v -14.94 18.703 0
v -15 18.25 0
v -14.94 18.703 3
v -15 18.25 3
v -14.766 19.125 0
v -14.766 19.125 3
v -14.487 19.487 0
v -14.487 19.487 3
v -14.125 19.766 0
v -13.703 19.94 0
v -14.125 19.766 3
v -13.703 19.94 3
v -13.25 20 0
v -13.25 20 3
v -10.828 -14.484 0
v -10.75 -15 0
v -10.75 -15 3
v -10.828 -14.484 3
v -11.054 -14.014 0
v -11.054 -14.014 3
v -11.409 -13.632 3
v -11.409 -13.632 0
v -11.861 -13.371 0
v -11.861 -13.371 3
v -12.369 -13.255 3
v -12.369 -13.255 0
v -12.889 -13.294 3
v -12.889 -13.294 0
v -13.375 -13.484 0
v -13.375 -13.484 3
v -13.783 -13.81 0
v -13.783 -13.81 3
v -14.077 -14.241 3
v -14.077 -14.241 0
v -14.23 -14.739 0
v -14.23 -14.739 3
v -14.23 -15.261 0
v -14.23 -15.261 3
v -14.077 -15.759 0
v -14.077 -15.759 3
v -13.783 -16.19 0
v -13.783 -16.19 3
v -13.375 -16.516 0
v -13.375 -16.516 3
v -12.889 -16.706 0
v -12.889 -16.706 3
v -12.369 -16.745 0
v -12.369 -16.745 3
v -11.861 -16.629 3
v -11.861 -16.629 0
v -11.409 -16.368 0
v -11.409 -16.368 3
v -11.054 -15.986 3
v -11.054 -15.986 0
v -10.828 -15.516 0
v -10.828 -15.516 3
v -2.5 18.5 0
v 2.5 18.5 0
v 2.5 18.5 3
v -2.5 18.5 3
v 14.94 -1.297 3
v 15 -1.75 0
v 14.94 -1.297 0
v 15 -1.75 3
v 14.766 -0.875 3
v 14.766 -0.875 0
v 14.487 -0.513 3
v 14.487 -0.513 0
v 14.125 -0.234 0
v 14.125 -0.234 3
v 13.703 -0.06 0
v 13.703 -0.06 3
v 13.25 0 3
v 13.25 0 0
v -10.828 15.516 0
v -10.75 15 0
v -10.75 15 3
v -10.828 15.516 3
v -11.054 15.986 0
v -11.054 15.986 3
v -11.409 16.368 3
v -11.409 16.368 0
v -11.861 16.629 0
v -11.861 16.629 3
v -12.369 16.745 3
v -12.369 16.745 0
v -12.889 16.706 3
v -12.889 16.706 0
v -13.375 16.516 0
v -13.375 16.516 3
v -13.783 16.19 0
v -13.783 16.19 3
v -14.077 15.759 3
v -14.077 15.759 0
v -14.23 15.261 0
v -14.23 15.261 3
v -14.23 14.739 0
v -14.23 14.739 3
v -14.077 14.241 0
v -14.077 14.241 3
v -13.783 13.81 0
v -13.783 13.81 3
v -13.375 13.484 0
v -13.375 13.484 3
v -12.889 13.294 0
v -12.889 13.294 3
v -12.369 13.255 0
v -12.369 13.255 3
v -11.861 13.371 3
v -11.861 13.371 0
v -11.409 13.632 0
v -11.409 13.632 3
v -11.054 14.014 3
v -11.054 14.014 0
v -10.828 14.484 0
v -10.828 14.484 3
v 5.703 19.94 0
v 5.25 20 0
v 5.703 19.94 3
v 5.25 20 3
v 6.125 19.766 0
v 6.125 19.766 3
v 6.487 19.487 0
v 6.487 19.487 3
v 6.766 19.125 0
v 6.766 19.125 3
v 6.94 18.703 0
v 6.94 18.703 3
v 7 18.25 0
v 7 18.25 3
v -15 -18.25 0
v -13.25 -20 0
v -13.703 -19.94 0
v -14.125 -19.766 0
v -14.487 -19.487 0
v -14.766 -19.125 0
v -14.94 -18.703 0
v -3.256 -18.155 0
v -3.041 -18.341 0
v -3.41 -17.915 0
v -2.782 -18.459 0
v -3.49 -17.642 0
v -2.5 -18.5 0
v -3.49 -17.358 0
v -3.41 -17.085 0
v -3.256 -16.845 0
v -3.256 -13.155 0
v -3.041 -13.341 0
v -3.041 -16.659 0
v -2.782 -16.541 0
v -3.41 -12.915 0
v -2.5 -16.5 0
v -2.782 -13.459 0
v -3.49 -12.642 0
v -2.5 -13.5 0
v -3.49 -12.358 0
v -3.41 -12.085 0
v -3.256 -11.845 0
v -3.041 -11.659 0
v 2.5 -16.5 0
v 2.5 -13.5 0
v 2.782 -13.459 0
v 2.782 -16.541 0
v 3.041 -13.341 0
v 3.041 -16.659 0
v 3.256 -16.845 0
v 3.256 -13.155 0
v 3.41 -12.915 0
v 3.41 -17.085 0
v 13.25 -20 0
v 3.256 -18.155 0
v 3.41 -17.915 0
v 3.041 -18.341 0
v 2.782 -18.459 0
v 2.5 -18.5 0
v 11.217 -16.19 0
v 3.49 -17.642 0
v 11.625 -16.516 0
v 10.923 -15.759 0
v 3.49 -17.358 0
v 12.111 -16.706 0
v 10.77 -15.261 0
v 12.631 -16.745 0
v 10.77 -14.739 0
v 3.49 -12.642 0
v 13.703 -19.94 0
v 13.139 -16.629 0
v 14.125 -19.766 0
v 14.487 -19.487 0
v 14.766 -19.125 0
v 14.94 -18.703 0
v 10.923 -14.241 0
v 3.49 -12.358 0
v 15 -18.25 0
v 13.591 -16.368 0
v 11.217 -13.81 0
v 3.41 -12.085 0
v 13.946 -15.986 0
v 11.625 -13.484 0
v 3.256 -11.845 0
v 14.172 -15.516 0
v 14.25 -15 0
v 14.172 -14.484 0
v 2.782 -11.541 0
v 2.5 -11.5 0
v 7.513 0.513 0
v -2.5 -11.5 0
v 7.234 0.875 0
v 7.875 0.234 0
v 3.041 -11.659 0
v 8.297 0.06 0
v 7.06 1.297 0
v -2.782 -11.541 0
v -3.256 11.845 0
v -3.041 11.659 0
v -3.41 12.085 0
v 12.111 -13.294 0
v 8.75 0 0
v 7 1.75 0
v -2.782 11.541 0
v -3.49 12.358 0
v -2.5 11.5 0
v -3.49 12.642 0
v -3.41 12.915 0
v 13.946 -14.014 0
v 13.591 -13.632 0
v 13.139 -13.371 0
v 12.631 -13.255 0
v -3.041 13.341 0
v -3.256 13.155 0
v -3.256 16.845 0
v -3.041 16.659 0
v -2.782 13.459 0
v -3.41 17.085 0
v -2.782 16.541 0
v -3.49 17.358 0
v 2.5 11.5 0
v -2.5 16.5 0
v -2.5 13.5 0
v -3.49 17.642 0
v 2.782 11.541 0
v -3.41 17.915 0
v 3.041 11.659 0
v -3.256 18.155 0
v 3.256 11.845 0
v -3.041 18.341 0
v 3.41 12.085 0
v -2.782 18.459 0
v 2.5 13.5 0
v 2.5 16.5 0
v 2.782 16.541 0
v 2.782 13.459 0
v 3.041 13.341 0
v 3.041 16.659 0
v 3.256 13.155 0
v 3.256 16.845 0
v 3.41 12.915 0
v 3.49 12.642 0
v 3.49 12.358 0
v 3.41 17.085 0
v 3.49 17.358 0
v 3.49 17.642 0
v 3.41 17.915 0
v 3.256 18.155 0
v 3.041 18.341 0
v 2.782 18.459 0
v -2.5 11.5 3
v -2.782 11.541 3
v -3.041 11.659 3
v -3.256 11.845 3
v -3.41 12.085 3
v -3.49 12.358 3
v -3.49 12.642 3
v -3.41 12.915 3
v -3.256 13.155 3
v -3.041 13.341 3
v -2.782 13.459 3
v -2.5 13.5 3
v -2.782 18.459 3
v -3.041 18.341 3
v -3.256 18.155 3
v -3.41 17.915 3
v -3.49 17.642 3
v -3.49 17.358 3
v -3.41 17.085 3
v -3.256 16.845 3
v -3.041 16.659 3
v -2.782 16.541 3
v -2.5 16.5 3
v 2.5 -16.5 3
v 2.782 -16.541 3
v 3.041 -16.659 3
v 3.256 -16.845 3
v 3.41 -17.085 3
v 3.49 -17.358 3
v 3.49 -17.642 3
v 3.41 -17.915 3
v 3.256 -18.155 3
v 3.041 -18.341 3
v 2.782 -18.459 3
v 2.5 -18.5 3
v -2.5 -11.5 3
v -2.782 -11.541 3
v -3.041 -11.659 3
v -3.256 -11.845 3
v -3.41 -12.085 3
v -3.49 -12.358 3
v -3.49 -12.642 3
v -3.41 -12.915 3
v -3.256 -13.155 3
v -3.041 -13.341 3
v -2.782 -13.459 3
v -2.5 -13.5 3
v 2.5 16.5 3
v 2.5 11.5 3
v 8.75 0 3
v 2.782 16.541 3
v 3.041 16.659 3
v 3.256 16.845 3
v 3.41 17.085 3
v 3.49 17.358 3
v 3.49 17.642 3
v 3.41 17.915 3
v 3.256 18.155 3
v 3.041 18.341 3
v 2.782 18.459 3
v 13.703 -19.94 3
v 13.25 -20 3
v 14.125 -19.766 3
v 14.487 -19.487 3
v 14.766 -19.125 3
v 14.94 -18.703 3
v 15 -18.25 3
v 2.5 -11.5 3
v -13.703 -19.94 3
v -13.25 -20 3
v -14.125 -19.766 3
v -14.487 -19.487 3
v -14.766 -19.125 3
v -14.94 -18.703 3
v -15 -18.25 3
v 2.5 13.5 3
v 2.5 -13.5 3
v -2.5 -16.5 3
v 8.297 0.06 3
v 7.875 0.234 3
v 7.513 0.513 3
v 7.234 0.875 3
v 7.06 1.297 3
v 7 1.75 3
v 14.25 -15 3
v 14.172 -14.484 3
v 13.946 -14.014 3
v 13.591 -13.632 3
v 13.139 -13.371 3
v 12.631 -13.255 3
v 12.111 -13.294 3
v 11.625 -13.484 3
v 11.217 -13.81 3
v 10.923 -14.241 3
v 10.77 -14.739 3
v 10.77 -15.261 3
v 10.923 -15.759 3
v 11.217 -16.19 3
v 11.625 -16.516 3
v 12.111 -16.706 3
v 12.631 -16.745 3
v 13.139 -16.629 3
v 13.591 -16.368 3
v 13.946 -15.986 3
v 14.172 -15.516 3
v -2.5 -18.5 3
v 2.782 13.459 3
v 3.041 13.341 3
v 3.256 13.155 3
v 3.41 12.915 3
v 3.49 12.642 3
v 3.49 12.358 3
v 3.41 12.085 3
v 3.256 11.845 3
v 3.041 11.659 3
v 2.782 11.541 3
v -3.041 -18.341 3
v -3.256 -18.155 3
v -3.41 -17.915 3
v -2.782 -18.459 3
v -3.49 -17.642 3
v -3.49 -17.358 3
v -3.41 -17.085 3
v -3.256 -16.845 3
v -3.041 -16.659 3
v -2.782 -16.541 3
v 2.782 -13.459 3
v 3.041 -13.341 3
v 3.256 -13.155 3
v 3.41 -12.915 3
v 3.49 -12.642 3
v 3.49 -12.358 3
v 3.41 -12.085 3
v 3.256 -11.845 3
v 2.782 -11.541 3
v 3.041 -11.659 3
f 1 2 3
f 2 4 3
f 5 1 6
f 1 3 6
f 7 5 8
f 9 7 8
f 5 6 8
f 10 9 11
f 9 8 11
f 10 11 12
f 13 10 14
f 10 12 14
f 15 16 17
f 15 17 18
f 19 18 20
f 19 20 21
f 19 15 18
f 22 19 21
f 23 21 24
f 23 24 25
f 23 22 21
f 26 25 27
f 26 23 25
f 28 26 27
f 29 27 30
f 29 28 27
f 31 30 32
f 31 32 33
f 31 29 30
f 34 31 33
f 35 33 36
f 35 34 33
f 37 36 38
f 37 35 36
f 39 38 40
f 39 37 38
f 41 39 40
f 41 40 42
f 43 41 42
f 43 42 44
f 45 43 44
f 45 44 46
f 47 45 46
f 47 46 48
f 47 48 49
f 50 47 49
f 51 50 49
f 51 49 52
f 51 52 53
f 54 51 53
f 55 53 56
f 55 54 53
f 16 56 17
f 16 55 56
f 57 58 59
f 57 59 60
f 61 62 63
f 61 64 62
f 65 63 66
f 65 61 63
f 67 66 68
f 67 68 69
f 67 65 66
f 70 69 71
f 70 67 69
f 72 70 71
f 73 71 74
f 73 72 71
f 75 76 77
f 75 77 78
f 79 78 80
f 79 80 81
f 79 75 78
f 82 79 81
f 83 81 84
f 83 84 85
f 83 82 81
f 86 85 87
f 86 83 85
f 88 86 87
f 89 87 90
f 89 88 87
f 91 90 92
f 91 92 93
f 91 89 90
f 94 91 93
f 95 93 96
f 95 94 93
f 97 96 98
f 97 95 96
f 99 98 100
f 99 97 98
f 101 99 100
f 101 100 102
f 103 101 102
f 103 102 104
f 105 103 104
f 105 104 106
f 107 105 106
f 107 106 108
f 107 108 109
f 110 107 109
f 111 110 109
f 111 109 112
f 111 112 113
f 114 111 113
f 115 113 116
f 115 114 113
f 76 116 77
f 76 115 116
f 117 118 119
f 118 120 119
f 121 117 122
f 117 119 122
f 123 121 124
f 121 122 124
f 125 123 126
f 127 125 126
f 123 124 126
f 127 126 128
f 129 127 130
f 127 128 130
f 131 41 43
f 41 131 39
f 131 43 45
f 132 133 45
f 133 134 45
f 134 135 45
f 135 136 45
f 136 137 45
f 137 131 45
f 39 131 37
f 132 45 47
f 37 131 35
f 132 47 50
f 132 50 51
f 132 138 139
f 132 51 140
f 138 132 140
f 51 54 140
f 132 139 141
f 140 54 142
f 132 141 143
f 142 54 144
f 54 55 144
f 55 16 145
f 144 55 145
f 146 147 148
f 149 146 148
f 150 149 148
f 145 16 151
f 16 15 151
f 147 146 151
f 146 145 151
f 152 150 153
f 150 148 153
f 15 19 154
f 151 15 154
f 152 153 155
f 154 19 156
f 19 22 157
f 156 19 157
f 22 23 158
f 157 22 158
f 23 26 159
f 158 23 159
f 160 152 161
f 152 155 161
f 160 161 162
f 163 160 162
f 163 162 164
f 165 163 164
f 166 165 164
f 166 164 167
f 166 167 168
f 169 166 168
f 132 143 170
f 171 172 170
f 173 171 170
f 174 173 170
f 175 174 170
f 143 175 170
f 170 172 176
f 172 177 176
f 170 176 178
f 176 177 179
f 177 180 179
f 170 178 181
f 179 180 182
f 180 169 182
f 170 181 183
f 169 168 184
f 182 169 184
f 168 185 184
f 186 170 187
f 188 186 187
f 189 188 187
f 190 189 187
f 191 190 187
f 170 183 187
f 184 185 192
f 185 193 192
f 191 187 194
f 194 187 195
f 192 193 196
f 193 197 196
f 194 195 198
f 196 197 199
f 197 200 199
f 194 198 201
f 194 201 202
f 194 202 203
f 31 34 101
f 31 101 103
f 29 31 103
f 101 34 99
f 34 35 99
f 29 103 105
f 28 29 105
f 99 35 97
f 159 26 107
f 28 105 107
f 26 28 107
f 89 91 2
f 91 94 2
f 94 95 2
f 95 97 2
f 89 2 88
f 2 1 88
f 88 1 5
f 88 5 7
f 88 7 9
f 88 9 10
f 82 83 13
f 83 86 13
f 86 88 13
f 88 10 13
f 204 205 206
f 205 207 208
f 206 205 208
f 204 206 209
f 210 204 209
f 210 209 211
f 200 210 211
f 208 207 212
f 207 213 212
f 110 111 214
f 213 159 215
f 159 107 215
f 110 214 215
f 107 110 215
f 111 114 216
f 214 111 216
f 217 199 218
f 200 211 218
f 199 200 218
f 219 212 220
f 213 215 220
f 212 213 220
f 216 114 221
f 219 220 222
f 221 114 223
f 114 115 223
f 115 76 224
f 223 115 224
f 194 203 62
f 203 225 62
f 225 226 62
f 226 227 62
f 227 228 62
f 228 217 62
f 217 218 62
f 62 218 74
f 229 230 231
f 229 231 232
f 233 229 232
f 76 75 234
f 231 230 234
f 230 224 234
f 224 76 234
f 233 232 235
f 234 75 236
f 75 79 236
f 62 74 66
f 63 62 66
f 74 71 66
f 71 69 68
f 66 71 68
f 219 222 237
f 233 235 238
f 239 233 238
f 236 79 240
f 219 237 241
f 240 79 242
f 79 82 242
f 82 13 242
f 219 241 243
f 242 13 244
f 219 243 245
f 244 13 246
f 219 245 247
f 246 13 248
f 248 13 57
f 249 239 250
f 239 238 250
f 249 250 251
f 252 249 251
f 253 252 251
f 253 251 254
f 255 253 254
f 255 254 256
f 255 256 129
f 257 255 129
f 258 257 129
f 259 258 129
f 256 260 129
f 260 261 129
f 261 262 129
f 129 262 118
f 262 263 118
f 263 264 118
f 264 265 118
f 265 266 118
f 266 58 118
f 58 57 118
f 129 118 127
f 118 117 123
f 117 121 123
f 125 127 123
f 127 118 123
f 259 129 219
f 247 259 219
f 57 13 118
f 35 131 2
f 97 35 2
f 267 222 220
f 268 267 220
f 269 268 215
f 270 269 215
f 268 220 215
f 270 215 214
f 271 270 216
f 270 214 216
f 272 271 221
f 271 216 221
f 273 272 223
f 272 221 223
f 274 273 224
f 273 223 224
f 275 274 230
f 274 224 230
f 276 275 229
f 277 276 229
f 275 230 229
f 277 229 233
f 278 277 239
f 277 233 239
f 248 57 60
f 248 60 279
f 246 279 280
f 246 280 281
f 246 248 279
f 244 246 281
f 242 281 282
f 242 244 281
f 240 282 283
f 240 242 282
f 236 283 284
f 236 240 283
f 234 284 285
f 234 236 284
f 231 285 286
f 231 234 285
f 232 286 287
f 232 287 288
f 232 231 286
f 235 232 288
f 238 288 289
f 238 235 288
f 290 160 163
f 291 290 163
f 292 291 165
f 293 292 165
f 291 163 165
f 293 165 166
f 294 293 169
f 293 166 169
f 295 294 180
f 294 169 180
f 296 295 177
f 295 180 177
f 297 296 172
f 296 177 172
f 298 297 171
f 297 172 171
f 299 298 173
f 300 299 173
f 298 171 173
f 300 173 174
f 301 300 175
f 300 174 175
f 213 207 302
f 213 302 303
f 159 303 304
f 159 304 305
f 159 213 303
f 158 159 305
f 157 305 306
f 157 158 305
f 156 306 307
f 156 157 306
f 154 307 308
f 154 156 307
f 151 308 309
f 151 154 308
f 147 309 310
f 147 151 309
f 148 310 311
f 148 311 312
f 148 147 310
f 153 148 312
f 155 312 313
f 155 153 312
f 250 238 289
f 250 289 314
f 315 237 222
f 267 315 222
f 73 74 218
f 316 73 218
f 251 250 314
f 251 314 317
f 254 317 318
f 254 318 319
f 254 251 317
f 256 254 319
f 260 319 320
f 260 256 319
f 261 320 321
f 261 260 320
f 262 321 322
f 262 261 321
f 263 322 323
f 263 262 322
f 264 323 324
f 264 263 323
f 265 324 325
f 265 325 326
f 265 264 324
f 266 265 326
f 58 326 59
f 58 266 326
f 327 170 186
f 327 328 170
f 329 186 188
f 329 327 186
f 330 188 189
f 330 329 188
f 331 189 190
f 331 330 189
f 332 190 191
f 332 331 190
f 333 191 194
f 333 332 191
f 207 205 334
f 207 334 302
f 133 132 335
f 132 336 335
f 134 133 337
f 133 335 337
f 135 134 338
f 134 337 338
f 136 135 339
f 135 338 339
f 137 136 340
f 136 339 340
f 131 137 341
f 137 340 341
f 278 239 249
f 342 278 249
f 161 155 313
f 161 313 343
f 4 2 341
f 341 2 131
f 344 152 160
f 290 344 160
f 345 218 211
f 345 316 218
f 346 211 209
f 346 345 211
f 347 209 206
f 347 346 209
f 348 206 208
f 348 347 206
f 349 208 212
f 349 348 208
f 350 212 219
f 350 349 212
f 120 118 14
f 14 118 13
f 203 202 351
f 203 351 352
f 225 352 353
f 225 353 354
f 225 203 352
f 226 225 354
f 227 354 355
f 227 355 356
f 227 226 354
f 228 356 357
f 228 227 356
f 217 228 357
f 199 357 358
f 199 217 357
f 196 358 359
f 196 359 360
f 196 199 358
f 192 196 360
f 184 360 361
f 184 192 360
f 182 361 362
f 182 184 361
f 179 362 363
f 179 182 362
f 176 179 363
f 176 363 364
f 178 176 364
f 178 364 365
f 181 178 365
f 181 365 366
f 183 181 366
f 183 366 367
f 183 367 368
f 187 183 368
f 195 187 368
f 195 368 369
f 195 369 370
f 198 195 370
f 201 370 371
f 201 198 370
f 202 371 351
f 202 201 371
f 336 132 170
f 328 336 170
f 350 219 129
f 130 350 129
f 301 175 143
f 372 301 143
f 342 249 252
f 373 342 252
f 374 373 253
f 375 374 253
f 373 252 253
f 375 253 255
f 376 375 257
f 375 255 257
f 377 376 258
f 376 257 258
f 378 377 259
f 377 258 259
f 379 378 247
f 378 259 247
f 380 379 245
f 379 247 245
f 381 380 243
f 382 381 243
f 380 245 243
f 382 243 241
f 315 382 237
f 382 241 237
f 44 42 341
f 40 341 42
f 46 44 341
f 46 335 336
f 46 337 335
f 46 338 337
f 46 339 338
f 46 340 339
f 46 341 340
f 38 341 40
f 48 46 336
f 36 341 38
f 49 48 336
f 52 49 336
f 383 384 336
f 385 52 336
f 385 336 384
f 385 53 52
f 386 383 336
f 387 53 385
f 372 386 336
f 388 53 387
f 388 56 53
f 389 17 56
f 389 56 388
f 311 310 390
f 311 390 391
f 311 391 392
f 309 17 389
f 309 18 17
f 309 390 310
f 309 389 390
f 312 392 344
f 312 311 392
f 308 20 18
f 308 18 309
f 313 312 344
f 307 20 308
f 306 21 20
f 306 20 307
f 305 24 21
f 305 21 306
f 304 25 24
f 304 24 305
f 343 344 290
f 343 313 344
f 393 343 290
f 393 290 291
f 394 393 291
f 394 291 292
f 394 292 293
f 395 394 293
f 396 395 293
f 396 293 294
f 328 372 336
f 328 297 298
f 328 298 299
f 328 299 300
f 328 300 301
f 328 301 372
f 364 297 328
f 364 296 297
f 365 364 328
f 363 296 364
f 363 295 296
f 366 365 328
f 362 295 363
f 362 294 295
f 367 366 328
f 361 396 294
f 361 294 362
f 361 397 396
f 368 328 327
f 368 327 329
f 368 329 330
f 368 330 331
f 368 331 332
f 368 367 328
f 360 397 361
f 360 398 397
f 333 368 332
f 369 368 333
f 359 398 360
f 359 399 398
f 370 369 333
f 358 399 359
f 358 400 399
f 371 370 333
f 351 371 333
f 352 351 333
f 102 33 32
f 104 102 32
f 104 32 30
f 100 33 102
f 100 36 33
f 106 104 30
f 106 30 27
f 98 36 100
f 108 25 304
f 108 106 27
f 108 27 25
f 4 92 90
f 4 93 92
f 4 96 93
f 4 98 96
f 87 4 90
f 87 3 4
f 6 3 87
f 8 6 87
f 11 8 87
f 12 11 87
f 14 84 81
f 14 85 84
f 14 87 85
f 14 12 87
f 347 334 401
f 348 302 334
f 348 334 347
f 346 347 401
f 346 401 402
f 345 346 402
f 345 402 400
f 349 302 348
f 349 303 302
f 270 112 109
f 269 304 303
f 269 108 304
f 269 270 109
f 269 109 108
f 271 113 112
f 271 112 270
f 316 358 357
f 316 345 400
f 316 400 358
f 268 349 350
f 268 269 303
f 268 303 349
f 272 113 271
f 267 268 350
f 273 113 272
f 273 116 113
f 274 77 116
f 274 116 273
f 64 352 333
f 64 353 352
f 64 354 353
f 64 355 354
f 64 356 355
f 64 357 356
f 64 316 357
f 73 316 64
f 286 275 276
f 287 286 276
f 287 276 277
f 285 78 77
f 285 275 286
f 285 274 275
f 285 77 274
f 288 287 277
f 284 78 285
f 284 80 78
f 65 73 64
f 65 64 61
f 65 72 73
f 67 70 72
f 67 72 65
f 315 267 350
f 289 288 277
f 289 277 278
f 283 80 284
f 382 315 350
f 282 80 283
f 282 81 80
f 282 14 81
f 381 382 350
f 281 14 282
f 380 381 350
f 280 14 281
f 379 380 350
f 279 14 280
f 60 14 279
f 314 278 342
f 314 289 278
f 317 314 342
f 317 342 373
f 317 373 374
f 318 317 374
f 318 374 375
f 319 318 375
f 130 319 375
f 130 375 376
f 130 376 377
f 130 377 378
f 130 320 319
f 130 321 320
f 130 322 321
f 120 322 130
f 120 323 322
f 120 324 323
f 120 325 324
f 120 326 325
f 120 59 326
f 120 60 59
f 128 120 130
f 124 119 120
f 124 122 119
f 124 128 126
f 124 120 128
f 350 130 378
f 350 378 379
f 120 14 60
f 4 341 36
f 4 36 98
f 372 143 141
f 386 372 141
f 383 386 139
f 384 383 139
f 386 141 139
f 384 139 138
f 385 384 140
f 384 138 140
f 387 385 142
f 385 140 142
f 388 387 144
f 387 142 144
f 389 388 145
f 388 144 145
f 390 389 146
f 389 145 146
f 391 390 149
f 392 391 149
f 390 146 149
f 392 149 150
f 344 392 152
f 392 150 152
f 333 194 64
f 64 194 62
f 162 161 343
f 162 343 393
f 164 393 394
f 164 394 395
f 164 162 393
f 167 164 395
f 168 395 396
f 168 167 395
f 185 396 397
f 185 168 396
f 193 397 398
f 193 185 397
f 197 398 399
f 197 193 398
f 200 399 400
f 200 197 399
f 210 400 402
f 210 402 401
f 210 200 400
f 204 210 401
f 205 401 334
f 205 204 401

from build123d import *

# Parameters (mm, degrees)
ESQUISSE1_R        = 1.75
BOSS_EXTRU_1_DEPTH = 3
CONG_1_R           = 1.75


with BuildPart() as part:
    # Esquisse1 → Boss.-Extru.1 (new body)
    with BuildSketch(Plane.XY):
        Polygon((-15, -20), (15, -20), (15, 0), (7, 0), (7, 20), (-15, 20), align=None)
        with Locations((12.5, -15)):
            Circle(ESQUISSE1_R, mode=Mode.SUBTRACT)
        with Locations((-12.5, -15)):
            Circle(ESQUISSE1_R, mode=Mode.SUBTRACT)
        with Locations((-12.5, 15)):
            Circle(ESQUISSE1_R, mode=Mode.SUBTRACT)
        with BuildLine():
            ThreePointArc((2.5, 16.5), (3.5, 17.5), (2.5, 18.5))
            Line((2.5, 18.5), (-2.5, 18.5))
            ThreePointArc((-2.5, 18.5), (-3.5, 17.5), (-2.5, 16.5))
            Line((-2.5, 16.5), (2.5, 16.5))
        make_face(mode=Mode.SUBTRACT)
        with BuildLine():
            ThreePointArc((2.5, -13.5), (3.5, -12.5), (2.5, -11.5))
            Line((2.5, -11.5), (-2.5, -11.5))
            ThreePointArc((-2.5, -11.5), (-3.5, -12.5), (-2.5, -13.5))
            Line((-2.5, -13.5), (2.5, -13.5))
        make_face(mode=Mode.SUBTRACT)
        with BuildLine():
            Line((-2.5, -16.5), (2.5, -16.5))
            ThreePointArc((2.5, -16.5), (3.5, -17.5), (2.5, -18.5))
            Line((2.5, -18.5), (-2.5, -18.5))
            ThreePointArc((-2.5, -18.5), (-3.5, -17.5), (-2.5, -16.5))
        make_face(mode=Mode.SUBTRACT)
        with BuildLine():
            Line((-2.5, 13.5), (2.5, 13.5))
            ThreePointArc((2.5, 13.5), (3.5, 12.5), (2.5, 11.5))
            Line((2.5, 11.5), (-2.5, 11.5))
            ThreePointArc((-2.5, 11.5), (-3.5, 12.5), (-2.5, 13.5))
        make_face(mode=Mode.SUBTRACT)
    extrude(amount=BOSS_EXTRU_1_DEPTH)

    # Congé1
    cong_1_edges = [part.edges().sort_by_distance(p)[0] for p in [
        (-15, -20, 1.5),
        (-15, 20, 1.5),
        (7, 20, 1.5),
        (7, 0, 1.5),
        (15, 0, 1.5),
        (15, -20, 1.5),
    ]]
    fillet(cong_1_edges, radius=CONG_1_R)


solid = part.part
